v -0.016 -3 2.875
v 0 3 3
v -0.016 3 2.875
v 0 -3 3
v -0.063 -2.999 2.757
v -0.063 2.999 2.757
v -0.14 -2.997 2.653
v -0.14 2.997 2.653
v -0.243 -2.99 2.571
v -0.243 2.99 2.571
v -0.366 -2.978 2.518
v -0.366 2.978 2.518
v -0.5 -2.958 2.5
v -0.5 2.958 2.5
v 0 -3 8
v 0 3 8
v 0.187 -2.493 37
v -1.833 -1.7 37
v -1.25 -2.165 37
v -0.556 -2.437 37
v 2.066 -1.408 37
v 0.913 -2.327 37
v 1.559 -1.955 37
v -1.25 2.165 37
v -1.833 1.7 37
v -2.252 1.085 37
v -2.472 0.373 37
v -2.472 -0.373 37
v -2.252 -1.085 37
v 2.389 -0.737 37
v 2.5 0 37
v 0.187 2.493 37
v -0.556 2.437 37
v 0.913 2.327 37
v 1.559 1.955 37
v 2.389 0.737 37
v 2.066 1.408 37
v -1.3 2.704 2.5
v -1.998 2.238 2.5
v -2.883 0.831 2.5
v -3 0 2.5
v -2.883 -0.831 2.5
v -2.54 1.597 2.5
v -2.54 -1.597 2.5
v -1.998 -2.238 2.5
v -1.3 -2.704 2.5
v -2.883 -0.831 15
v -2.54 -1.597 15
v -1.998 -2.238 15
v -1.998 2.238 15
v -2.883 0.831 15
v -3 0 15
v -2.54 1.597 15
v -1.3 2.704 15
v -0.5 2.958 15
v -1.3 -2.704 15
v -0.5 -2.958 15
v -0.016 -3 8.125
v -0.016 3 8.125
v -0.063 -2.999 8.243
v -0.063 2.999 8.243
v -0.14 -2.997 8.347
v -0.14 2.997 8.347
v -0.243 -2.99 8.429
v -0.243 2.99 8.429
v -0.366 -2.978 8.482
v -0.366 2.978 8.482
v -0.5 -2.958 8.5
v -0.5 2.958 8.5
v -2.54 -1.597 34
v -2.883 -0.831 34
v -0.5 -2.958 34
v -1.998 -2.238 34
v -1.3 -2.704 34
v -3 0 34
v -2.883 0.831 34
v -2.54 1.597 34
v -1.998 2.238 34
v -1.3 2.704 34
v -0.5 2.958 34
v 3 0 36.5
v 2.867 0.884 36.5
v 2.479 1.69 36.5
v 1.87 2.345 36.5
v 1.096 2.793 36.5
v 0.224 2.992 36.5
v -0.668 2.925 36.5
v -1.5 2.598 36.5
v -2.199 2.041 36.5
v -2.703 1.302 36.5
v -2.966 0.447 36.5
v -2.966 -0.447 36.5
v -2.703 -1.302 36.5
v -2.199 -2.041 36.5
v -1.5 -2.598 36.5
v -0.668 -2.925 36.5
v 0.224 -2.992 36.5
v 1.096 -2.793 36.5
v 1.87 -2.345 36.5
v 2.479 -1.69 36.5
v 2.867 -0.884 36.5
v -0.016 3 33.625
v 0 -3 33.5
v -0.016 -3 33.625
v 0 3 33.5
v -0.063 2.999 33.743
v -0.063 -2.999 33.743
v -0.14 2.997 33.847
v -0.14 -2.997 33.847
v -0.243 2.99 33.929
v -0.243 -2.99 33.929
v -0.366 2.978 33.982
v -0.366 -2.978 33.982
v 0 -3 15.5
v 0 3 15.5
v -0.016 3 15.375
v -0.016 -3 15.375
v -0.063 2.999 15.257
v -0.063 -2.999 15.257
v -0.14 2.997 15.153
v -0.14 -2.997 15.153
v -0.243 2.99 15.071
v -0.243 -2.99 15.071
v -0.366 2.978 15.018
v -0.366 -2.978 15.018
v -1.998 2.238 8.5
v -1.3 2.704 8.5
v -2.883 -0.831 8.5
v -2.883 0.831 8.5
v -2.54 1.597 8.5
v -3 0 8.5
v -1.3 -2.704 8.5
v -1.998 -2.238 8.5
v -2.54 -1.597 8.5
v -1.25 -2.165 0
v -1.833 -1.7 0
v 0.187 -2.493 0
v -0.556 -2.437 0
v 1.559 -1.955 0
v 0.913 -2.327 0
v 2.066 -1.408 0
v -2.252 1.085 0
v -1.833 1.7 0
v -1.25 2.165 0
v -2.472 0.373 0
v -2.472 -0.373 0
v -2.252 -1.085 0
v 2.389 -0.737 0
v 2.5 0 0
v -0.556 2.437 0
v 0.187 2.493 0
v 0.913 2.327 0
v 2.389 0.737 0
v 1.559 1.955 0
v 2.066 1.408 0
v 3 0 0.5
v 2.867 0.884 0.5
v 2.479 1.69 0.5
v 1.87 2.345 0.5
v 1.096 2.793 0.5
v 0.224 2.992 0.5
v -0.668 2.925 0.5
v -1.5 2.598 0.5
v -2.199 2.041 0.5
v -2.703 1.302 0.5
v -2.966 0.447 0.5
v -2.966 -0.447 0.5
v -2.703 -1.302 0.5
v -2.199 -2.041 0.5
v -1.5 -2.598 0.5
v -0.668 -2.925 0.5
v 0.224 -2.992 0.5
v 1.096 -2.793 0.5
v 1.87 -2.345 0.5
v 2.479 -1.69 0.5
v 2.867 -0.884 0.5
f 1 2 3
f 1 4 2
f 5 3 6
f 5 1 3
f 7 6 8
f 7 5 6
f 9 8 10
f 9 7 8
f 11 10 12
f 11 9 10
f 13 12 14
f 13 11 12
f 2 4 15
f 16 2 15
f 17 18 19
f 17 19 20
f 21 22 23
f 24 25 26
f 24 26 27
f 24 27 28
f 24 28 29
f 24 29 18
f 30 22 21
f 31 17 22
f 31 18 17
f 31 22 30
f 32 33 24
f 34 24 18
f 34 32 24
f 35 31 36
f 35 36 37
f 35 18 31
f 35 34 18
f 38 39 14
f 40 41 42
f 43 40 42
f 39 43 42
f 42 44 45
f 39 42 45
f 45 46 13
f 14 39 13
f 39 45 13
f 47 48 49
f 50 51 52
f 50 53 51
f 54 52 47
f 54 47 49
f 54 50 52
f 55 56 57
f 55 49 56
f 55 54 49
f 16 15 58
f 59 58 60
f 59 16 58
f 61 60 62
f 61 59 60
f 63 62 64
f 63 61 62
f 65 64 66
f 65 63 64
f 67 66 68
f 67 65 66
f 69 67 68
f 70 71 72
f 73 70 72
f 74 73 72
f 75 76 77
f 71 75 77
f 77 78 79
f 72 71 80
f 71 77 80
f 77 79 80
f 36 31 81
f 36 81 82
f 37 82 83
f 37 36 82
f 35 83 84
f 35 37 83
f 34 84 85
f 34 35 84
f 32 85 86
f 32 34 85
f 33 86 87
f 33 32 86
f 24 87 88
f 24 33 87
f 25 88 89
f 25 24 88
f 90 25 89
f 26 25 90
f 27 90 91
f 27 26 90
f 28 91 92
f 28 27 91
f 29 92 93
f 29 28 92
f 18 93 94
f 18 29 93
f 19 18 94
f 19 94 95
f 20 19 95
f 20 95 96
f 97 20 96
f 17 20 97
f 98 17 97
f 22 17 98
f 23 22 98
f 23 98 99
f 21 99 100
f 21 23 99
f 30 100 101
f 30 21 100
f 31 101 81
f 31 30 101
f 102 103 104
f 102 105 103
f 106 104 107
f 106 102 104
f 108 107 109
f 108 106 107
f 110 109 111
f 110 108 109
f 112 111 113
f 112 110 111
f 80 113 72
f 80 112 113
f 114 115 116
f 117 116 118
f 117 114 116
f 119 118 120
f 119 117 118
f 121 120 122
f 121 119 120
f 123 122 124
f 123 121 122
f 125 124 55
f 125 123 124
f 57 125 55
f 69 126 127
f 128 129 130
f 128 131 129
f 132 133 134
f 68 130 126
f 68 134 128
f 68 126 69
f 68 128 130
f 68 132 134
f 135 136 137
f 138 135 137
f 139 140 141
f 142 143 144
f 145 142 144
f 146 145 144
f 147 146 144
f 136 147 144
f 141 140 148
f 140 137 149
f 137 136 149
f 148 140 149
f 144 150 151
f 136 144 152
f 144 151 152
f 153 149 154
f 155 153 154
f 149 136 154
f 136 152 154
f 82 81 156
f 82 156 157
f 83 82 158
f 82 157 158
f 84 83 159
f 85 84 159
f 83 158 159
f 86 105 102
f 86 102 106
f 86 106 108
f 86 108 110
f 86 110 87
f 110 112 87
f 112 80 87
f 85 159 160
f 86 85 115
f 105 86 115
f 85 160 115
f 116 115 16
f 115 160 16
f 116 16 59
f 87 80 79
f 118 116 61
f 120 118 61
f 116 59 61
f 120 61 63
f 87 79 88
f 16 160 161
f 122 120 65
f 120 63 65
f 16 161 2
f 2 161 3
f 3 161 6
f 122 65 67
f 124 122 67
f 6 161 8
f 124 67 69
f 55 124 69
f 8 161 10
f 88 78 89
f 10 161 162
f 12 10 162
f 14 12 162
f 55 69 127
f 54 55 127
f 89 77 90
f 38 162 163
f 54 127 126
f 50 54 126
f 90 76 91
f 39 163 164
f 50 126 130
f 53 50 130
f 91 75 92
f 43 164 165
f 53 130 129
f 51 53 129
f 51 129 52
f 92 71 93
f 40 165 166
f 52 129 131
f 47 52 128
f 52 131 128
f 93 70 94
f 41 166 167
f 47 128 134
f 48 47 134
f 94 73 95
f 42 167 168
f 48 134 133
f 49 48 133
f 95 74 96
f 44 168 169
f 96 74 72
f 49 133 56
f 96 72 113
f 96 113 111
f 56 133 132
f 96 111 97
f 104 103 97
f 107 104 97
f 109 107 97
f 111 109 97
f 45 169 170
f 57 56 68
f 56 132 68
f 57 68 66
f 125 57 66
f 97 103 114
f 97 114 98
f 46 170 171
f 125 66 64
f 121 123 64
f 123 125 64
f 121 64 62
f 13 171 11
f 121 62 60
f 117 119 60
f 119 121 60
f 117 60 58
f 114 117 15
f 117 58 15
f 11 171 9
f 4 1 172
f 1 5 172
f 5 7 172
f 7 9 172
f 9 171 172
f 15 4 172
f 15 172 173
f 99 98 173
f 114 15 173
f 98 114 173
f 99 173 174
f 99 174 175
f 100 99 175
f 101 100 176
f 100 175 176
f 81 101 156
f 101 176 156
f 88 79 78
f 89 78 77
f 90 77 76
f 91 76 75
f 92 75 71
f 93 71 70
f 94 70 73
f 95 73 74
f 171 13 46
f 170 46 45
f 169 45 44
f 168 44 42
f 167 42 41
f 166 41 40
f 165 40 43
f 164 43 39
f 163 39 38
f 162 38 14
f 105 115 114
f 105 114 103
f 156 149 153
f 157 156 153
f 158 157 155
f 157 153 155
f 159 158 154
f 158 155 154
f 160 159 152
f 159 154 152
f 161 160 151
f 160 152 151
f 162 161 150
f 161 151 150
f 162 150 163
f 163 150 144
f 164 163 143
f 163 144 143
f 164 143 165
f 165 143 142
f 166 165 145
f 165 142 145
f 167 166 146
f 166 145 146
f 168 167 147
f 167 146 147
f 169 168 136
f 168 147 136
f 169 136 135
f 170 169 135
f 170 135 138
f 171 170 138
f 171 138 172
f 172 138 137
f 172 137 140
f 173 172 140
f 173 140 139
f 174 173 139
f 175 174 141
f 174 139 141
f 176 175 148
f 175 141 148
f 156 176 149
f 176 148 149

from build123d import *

# Parameters (mm, degrees)
F0_R     = 3
F1_DEPTH = 37
F2_W     = 3
F2_H     = 19
F2_H_2   = 6
F3_DEPTH = 12.5
F4_SIZE  = 0.5
F5_R     = 0.5


with BuildPart() as f1:
    # F0 (on Top) → F1 (new body)
    with BuildSketch(Plane.XY):
        Circle(F0_R)
    extrude(amount=F1_DEPTH)

    # F2 (on Front) → F3 (cut, symmetric)
    with BuildSketch(Plane.XZ):
        with Locations((-1.5, 24.5)):
            Rectangle(F2_W, F2_H)
        with Locations((-1.5, 5.5)):
            Rectangle(F2_W, F2_H_2)
    extrude(amount=F3_DEPTH, both=True, mode=Mode.SUBTRACT)

    # F4
    f4_edges = [f1.edges().sort_by_distance(p)[0] for p in [
        (-3, 0, 37),
        (-3, 0, 0),
    ]]
    chamfer(f4_edges, length=F4_SIZE)

    # F5
    f5_edges = [f1.edges().sort_by_distance(p)[0] for p in [
        (0, 0, 8.5),
        (0, 0, 2.5),
        (0, 0, 15),
        (0, 0, 34),
    ]]
    fillet(f5_edges, radius=F5_R)


solid = f1.part
